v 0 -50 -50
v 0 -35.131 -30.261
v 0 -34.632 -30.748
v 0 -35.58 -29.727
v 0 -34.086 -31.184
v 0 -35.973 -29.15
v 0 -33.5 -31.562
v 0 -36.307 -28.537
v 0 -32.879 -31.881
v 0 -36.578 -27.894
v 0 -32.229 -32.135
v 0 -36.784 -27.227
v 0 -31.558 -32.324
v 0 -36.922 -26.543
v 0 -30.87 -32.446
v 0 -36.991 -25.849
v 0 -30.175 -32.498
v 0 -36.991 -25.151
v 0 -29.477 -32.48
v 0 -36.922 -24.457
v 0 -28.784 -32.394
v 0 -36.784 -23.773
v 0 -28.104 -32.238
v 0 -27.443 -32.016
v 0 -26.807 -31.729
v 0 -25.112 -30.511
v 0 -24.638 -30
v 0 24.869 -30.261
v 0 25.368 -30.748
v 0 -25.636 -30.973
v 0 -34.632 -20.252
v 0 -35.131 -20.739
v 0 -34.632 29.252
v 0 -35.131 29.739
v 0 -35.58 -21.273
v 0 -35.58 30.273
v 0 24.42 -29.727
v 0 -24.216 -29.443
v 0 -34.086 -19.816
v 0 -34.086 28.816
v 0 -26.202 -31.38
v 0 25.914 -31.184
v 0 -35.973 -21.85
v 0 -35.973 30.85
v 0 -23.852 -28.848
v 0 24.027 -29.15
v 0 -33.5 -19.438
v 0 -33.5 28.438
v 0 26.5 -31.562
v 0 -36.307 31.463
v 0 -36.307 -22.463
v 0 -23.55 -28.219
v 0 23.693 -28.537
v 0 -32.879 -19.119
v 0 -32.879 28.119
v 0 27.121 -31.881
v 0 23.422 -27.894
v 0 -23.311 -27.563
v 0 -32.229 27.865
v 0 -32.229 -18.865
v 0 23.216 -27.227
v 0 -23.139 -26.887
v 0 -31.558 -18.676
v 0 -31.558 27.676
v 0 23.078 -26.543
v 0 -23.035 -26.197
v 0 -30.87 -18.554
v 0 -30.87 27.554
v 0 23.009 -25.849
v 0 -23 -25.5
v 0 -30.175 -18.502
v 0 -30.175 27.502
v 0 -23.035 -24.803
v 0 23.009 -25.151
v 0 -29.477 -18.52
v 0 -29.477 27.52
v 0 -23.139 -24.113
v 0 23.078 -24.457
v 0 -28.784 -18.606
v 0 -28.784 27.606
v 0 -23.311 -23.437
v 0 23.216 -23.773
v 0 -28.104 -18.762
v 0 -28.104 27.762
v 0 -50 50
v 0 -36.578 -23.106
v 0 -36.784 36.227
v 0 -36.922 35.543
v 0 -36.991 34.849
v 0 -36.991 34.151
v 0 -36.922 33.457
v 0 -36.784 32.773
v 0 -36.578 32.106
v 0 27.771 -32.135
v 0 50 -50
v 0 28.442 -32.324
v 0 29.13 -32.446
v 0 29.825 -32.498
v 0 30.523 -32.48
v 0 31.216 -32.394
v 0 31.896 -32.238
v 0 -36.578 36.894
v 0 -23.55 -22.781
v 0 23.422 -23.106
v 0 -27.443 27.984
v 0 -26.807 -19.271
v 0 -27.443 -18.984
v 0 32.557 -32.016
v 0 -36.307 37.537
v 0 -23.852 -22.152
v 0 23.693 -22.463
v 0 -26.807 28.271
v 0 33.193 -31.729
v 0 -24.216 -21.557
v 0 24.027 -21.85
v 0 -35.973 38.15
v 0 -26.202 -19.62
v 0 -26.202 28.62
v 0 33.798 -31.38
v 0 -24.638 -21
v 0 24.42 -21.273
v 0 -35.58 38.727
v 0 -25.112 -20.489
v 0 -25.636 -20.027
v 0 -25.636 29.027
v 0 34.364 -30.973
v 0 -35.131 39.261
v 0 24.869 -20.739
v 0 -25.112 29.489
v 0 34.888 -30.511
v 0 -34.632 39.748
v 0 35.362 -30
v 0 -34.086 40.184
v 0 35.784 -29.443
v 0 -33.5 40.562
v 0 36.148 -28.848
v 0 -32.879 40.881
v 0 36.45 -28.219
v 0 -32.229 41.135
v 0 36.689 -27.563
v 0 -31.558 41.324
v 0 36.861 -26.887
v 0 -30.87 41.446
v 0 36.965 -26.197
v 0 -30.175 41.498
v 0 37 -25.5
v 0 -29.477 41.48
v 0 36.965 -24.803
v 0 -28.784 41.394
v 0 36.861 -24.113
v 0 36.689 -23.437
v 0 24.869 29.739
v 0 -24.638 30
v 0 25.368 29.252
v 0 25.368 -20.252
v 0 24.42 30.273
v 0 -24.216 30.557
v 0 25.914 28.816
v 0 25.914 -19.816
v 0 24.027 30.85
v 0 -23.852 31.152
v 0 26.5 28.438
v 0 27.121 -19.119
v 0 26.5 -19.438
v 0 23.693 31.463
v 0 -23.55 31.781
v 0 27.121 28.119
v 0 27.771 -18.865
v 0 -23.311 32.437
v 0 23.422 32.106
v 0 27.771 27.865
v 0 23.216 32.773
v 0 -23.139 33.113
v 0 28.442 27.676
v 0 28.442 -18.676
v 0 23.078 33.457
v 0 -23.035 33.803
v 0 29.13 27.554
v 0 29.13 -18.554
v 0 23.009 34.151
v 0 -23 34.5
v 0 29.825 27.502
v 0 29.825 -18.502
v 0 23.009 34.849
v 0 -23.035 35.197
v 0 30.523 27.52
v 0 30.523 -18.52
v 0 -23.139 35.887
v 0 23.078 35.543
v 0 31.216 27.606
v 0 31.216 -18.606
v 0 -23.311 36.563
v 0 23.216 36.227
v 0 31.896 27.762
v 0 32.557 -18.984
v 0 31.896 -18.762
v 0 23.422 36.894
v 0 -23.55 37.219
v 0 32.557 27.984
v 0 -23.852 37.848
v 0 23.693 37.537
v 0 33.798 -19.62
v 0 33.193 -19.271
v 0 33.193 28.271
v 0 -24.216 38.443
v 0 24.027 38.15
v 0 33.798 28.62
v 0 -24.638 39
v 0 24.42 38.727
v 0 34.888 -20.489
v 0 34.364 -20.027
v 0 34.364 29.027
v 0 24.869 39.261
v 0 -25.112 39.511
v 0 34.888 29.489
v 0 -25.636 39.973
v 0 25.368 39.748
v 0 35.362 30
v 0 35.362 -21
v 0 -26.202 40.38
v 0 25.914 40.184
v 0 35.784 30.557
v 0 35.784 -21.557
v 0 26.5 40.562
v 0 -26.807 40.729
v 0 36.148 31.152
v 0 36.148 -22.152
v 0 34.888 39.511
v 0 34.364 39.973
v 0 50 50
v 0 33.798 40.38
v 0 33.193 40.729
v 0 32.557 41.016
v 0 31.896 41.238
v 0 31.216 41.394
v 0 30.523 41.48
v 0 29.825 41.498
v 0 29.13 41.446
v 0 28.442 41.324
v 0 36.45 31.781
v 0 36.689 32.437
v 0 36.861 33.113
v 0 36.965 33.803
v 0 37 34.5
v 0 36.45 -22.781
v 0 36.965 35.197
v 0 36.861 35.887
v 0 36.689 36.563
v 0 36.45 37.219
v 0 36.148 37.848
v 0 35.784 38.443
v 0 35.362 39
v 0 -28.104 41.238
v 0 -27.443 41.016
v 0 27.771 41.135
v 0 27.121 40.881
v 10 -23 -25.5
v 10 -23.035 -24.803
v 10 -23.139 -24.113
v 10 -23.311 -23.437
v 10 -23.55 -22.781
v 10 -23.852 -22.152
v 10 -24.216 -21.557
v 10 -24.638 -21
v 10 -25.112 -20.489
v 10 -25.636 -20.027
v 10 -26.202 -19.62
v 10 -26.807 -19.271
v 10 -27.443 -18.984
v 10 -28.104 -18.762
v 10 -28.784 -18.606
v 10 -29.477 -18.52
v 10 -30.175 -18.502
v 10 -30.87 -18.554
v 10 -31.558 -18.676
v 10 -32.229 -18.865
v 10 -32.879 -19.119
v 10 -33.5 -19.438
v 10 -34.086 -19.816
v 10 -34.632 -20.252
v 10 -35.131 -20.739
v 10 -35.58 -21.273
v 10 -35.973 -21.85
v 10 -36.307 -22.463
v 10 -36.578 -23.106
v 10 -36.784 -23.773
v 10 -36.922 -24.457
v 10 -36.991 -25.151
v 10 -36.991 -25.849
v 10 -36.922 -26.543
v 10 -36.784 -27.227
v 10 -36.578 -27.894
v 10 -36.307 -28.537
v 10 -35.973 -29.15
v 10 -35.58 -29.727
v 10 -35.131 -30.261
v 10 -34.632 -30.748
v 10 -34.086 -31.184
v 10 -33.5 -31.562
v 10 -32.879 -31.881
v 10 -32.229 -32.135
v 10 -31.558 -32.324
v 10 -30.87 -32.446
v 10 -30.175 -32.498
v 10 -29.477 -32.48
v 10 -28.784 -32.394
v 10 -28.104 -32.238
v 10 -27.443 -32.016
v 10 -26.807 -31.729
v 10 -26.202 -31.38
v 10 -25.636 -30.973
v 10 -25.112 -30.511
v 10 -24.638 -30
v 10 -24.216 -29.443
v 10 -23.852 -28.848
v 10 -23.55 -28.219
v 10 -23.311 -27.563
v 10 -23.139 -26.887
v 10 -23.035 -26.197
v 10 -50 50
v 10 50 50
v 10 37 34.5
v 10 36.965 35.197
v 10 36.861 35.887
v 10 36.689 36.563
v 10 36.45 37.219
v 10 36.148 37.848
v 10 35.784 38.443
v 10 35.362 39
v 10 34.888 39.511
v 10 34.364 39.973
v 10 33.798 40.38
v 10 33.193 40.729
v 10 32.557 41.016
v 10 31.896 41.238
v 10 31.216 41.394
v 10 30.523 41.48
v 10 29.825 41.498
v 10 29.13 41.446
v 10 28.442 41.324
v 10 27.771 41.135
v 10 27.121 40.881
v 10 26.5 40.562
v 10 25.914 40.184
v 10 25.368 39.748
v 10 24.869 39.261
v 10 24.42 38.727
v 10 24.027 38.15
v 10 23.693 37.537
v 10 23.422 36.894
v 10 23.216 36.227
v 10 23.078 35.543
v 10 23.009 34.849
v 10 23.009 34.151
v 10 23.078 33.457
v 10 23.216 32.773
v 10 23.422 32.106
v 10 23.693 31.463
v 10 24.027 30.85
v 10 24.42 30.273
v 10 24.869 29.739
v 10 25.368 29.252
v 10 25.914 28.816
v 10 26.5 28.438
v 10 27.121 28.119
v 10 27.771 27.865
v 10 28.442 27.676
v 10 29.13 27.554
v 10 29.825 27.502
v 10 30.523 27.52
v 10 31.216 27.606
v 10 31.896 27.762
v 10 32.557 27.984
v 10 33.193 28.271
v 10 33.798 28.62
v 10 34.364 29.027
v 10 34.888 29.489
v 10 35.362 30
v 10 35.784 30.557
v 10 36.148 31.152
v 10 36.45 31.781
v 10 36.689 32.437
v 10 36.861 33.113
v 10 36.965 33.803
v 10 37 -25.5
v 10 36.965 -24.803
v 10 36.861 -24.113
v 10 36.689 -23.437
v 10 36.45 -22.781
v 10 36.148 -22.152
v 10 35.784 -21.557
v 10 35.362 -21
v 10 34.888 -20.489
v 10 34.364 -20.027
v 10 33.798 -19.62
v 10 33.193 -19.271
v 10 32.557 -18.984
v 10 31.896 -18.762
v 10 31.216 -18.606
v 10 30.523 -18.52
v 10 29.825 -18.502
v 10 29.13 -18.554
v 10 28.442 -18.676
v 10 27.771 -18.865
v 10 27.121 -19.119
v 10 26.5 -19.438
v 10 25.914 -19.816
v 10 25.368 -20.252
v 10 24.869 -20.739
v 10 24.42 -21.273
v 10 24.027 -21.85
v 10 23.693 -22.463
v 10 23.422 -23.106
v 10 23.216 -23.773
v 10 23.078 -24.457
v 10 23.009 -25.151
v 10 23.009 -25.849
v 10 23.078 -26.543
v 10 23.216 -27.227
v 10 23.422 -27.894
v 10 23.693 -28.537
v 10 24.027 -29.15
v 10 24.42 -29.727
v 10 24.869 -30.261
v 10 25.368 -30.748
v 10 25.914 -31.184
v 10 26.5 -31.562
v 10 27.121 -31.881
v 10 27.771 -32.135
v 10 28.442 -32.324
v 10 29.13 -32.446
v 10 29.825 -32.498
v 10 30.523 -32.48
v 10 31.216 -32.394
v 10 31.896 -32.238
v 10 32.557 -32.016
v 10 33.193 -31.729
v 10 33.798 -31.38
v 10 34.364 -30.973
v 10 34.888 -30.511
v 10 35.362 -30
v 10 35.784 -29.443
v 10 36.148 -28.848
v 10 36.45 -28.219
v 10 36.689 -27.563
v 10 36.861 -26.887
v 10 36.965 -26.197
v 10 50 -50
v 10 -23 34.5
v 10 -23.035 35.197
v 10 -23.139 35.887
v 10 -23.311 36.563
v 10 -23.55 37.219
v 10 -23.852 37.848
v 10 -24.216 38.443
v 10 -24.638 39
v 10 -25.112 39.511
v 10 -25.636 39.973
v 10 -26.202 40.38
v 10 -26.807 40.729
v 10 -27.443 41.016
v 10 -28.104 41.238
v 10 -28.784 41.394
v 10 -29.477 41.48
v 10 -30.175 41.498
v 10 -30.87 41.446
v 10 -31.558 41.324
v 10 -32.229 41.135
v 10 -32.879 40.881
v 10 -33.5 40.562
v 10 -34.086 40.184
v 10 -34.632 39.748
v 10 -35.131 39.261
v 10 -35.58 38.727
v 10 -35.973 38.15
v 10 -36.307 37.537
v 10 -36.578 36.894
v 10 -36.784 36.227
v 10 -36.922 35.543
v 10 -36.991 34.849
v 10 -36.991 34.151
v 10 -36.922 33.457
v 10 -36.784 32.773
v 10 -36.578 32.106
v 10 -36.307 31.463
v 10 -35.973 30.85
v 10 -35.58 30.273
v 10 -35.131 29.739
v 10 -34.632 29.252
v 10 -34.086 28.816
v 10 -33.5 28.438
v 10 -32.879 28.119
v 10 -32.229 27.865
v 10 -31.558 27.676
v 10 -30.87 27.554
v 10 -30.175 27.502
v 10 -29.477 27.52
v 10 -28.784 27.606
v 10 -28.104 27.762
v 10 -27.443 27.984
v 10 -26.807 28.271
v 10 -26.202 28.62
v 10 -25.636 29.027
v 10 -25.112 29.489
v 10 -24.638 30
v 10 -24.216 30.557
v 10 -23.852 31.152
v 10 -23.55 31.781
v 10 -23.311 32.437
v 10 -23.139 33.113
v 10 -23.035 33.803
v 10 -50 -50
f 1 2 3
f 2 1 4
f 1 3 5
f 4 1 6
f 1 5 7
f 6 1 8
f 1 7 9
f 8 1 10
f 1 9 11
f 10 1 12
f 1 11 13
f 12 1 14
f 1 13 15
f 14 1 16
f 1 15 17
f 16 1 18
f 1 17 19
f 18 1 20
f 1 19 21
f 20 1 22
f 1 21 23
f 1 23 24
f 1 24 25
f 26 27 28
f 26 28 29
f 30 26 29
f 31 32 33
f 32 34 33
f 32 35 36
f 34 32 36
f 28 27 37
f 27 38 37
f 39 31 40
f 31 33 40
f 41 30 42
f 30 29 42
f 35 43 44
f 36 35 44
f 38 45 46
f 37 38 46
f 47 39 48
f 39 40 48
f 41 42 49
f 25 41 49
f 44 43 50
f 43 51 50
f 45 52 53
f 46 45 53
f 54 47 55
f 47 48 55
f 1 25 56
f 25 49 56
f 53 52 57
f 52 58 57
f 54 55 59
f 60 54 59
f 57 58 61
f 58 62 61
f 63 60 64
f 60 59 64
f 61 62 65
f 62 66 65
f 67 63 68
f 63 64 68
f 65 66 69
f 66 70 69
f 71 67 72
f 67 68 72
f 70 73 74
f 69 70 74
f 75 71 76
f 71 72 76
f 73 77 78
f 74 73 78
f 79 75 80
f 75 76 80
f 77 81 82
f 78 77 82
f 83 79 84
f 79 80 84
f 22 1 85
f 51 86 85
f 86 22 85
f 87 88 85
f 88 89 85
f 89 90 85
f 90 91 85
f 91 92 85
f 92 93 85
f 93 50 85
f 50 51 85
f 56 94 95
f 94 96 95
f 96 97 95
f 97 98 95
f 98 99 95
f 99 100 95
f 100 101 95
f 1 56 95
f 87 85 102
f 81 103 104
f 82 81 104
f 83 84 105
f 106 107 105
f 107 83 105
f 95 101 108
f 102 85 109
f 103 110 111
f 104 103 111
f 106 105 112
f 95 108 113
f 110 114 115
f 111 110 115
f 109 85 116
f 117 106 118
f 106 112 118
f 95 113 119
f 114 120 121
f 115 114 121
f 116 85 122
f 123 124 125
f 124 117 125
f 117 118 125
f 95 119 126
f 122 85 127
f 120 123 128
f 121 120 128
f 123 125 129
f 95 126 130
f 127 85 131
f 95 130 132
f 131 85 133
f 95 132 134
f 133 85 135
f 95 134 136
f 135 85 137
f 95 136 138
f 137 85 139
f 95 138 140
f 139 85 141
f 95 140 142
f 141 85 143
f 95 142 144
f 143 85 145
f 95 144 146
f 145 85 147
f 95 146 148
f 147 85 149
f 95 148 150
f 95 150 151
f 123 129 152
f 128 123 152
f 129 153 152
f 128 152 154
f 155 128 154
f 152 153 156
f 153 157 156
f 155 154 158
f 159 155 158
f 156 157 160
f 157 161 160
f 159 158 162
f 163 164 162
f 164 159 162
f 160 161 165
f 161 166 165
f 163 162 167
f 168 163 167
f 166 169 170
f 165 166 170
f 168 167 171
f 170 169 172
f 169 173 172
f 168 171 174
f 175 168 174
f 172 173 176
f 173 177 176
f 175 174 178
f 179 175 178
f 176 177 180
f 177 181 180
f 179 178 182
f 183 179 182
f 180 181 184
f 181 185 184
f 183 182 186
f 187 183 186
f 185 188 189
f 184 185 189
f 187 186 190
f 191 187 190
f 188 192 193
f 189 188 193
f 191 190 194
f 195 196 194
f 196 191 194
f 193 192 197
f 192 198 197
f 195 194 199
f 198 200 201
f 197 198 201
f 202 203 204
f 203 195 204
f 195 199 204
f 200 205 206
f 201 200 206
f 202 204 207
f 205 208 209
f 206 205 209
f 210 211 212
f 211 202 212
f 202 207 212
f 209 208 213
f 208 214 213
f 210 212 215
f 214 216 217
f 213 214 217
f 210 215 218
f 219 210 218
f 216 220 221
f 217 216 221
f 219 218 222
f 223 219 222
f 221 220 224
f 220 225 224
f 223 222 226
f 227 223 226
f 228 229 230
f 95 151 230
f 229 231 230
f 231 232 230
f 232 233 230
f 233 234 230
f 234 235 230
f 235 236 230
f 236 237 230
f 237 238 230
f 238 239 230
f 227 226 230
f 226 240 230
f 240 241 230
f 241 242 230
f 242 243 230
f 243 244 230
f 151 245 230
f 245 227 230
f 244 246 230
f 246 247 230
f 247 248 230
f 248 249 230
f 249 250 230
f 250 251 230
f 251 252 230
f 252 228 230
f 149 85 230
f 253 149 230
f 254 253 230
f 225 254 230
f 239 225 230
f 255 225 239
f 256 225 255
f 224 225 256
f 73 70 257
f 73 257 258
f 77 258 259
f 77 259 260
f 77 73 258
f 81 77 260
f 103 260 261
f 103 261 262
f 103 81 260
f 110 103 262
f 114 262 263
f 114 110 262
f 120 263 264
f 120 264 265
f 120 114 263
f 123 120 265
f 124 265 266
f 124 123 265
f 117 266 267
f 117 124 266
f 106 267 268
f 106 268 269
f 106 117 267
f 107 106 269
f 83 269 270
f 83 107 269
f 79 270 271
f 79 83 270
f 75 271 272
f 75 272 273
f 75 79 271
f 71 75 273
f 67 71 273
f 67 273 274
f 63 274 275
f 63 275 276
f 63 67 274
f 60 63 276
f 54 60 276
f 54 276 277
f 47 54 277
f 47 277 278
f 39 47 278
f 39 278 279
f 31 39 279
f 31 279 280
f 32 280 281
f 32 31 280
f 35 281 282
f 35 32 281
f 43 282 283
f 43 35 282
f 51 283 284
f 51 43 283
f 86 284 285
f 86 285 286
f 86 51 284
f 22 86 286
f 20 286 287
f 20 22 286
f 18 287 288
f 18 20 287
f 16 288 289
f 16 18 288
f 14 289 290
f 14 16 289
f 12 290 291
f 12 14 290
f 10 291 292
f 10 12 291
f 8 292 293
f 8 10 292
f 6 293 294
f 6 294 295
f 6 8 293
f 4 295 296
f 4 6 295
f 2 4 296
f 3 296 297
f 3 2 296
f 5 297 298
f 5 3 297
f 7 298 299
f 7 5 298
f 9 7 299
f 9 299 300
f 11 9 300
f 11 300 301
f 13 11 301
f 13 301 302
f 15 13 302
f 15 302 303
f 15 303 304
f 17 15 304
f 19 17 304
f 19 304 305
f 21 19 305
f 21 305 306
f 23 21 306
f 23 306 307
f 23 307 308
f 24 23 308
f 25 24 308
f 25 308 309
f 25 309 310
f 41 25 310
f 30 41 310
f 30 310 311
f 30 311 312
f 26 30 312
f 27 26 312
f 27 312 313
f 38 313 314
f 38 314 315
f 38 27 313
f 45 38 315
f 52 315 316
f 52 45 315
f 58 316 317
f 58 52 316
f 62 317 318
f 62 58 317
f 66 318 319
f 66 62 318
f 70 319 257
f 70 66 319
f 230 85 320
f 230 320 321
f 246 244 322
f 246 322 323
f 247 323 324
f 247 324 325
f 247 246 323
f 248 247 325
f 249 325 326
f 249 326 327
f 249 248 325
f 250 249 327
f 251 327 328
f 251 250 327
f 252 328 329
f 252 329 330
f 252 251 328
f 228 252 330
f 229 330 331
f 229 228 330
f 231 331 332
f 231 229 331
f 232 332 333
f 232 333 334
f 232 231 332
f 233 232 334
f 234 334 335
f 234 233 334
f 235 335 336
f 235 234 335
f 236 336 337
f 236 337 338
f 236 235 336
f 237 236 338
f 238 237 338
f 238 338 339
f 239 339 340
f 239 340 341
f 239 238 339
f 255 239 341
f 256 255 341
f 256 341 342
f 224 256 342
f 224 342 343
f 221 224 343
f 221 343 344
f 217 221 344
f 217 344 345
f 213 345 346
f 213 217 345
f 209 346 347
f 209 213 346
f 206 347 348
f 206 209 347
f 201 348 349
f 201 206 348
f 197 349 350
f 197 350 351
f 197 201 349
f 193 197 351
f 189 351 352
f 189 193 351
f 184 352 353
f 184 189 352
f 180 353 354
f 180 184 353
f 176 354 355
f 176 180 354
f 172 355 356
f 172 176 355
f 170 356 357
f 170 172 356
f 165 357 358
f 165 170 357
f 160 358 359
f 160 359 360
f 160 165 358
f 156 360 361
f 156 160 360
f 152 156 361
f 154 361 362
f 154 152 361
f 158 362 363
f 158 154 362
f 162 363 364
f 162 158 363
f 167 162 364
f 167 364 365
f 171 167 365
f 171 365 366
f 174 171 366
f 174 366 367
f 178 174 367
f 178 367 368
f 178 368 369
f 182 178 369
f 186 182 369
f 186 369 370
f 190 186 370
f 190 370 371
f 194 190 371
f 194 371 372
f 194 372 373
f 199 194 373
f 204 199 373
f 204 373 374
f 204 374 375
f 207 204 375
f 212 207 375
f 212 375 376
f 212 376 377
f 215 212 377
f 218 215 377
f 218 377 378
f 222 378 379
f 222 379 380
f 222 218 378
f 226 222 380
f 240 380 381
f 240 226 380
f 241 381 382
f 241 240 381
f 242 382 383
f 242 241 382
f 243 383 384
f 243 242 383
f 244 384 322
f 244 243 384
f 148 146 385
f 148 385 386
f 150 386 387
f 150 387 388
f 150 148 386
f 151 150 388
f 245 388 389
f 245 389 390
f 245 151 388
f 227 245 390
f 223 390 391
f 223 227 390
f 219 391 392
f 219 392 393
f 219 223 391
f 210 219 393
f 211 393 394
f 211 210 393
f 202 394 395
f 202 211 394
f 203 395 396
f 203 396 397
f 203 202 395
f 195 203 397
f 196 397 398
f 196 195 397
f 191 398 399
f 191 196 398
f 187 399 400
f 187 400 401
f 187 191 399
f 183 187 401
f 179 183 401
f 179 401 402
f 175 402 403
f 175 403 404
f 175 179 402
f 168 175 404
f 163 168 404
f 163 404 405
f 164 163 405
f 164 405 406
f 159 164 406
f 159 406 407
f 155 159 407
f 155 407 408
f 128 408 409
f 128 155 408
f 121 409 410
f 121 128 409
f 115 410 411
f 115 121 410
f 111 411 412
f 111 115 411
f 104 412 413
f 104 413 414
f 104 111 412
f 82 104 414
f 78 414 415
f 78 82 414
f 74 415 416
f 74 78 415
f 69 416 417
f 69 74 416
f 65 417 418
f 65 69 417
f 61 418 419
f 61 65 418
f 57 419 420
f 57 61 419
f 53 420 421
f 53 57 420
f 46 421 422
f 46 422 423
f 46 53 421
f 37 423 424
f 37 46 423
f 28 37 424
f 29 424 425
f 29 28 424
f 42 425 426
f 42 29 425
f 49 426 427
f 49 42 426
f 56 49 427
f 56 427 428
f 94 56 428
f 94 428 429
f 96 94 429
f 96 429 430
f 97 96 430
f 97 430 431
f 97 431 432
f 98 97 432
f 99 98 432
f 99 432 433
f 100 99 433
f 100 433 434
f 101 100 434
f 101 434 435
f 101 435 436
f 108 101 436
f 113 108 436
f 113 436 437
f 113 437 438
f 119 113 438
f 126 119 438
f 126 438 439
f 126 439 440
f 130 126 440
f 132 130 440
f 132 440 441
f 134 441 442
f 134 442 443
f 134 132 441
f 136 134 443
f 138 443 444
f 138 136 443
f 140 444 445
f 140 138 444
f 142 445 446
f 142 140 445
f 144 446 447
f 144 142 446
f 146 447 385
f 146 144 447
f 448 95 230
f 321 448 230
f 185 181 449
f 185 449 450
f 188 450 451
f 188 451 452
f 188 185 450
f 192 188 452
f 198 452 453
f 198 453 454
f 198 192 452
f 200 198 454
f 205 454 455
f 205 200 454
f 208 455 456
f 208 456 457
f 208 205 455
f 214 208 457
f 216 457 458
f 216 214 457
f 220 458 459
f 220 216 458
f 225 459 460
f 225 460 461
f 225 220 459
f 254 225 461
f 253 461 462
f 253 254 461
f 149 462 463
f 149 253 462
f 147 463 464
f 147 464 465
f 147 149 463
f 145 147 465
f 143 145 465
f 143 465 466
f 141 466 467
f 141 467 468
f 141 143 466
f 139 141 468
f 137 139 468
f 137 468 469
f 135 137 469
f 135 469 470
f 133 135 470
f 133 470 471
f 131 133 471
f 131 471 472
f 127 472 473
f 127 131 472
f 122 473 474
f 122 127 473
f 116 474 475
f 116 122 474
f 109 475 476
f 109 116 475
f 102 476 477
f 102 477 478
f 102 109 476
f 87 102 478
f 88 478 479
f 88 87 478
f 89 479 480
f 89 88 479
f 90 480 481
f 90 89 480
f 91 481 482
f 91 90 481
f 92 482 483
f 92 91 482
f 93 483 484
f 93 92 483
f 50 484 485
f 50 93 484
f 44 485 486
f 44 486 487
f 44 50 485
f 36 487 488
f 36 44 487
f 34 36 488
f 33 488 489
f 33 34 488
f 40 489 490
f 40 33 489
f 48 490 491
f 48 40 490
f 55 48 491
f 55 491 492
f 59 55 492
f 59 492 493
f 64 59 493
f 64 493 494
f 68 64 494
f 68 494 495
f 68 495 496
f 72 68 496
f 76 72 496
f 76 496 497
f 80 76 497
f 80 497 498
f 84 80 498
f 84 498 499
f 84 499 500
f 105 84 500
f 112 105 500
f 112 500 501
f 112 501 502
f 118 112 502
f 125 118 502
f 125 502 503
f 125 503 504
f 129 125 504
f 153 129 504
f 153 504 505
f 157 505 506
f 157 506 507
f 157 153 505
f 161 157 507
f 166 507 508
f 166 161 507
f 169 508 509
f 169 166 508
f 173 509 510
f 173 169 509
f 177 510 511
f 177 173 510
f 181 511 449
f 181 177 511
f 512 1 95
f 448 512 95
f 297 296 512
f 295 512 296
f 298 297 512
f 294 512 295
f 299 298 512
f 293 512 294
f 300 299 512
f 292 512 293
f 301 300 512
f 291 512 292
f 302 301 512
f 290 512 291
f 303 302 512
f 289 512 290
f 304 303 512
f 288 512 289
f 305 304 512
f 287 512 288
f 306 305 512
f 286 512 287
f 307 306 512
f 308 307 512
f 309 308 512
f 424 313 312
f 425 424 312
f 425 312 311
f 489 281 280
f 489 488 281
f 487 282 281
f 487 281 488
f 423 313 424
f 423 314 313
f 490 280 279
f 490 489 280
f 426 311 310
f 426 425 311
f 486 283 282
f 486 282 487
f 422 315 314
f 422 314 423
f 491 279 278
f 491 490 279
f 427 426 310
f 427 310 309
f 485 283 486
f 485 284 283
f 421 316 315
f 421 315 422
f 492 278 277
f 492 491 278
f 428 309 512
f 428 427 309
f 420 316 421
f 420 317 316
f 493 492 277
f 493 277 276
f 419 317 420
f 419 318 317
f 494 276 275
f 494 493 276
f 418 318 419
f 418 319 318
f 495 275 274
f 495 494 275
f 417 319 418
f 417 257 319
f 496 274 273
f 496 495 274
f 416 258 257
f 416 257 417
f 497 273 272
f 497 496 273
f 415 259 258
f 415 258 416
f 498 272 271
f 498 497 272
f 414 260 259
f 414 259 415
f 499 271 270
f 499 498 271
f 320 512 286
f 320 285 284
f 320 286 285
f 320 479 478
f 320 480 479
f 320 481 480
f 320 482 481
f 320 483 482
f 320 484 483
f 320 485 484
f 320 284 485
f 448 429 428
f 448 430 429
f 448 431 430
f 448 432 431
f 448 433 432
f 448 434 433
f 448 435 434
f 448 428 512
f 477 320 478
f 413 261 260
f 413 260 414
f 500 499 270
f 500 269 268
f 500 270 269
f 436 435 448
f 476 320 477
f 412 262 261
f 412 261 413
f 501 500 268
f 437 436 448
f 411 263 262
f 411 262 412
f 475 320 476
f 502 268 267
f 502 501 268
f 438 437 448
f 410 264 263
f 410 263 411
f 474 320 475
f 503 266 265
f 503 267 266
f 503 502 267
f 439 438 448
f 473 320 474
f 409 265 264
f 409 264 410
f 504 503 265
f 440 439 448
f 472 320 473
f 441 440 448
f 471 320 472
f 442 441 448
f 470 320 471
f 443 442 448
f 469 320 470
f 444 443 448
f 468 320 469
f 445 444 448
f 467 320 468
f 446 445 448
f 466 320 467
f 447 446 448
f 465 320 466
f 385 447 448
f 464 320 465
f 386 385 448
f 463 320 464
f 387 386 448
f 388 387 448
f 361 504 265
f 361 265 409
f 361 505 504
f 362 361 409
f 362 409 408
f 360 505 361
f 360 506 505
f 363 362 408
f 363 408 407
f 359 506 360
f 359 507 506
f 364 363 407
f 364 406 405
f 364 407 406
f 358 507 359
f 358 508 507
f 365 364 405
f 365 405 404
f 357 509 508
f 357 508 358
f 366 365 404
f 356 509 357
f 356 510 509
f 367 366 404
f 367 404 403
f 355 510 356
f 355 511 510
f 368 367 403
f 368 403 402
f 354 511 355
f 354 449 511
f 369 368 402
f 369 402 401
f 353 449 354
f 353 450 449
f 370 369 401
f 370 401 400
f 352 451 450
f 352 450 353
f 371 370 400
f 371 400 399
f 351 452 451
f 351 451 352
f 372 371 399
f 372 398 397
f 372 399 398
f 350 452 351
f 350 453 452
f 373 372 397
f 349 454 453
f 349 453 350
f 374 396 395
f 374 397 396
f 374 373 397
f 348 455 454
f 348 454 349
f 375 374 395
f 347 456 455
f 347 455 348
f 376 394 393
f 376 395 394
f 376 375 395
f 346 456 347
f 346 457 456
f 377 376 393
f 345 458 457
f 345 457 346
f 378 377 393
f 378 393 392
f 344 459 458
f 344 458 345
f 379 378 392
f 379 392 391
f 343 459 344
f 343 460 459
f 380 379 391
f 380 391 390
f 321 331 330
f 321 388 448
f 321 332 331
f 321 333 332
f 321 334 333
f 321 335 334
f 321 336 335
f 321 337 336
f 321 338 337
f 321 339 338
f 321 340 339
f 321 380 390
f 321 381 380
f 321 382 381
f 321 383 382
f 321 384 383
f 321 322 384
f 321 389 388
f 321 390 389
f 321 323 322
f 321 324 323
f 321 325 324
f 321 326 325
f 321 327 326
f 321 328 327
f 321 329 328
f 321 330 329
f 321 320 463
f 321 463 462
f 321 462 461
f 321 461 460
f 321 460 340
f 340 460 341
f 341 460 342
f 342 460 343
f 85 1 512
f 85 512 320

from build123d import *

# Parameters (mm, degrees)
F0_W     = 100
F0_H     = 100
F0_R     = 7
F1_DEPTH = 10


with BuildPart() as f1:
    # F0 (on Right) → F1 (new body)
    with BuildSketch(Plane.YZ):
        Rectangle(F0_W, F0_H)
        with Locations((-30, -25.5)):
            Circle(F0_R, mode=Mode.SUBTRACT)
        with Locations((30, -25.5)):
            Circle(F0_R, mode=Mode.SUBTRACT)
        with Locations((-30, 34.5)):
            Circle(F0_R, mode=Mode.SUBTRACT)
        with Locations((30, 34.5)):
            Circle(F0_R, mode=Mode.SUBTRACT)
    extrude(amount=F1_DEPTH)


solid = f1.part
